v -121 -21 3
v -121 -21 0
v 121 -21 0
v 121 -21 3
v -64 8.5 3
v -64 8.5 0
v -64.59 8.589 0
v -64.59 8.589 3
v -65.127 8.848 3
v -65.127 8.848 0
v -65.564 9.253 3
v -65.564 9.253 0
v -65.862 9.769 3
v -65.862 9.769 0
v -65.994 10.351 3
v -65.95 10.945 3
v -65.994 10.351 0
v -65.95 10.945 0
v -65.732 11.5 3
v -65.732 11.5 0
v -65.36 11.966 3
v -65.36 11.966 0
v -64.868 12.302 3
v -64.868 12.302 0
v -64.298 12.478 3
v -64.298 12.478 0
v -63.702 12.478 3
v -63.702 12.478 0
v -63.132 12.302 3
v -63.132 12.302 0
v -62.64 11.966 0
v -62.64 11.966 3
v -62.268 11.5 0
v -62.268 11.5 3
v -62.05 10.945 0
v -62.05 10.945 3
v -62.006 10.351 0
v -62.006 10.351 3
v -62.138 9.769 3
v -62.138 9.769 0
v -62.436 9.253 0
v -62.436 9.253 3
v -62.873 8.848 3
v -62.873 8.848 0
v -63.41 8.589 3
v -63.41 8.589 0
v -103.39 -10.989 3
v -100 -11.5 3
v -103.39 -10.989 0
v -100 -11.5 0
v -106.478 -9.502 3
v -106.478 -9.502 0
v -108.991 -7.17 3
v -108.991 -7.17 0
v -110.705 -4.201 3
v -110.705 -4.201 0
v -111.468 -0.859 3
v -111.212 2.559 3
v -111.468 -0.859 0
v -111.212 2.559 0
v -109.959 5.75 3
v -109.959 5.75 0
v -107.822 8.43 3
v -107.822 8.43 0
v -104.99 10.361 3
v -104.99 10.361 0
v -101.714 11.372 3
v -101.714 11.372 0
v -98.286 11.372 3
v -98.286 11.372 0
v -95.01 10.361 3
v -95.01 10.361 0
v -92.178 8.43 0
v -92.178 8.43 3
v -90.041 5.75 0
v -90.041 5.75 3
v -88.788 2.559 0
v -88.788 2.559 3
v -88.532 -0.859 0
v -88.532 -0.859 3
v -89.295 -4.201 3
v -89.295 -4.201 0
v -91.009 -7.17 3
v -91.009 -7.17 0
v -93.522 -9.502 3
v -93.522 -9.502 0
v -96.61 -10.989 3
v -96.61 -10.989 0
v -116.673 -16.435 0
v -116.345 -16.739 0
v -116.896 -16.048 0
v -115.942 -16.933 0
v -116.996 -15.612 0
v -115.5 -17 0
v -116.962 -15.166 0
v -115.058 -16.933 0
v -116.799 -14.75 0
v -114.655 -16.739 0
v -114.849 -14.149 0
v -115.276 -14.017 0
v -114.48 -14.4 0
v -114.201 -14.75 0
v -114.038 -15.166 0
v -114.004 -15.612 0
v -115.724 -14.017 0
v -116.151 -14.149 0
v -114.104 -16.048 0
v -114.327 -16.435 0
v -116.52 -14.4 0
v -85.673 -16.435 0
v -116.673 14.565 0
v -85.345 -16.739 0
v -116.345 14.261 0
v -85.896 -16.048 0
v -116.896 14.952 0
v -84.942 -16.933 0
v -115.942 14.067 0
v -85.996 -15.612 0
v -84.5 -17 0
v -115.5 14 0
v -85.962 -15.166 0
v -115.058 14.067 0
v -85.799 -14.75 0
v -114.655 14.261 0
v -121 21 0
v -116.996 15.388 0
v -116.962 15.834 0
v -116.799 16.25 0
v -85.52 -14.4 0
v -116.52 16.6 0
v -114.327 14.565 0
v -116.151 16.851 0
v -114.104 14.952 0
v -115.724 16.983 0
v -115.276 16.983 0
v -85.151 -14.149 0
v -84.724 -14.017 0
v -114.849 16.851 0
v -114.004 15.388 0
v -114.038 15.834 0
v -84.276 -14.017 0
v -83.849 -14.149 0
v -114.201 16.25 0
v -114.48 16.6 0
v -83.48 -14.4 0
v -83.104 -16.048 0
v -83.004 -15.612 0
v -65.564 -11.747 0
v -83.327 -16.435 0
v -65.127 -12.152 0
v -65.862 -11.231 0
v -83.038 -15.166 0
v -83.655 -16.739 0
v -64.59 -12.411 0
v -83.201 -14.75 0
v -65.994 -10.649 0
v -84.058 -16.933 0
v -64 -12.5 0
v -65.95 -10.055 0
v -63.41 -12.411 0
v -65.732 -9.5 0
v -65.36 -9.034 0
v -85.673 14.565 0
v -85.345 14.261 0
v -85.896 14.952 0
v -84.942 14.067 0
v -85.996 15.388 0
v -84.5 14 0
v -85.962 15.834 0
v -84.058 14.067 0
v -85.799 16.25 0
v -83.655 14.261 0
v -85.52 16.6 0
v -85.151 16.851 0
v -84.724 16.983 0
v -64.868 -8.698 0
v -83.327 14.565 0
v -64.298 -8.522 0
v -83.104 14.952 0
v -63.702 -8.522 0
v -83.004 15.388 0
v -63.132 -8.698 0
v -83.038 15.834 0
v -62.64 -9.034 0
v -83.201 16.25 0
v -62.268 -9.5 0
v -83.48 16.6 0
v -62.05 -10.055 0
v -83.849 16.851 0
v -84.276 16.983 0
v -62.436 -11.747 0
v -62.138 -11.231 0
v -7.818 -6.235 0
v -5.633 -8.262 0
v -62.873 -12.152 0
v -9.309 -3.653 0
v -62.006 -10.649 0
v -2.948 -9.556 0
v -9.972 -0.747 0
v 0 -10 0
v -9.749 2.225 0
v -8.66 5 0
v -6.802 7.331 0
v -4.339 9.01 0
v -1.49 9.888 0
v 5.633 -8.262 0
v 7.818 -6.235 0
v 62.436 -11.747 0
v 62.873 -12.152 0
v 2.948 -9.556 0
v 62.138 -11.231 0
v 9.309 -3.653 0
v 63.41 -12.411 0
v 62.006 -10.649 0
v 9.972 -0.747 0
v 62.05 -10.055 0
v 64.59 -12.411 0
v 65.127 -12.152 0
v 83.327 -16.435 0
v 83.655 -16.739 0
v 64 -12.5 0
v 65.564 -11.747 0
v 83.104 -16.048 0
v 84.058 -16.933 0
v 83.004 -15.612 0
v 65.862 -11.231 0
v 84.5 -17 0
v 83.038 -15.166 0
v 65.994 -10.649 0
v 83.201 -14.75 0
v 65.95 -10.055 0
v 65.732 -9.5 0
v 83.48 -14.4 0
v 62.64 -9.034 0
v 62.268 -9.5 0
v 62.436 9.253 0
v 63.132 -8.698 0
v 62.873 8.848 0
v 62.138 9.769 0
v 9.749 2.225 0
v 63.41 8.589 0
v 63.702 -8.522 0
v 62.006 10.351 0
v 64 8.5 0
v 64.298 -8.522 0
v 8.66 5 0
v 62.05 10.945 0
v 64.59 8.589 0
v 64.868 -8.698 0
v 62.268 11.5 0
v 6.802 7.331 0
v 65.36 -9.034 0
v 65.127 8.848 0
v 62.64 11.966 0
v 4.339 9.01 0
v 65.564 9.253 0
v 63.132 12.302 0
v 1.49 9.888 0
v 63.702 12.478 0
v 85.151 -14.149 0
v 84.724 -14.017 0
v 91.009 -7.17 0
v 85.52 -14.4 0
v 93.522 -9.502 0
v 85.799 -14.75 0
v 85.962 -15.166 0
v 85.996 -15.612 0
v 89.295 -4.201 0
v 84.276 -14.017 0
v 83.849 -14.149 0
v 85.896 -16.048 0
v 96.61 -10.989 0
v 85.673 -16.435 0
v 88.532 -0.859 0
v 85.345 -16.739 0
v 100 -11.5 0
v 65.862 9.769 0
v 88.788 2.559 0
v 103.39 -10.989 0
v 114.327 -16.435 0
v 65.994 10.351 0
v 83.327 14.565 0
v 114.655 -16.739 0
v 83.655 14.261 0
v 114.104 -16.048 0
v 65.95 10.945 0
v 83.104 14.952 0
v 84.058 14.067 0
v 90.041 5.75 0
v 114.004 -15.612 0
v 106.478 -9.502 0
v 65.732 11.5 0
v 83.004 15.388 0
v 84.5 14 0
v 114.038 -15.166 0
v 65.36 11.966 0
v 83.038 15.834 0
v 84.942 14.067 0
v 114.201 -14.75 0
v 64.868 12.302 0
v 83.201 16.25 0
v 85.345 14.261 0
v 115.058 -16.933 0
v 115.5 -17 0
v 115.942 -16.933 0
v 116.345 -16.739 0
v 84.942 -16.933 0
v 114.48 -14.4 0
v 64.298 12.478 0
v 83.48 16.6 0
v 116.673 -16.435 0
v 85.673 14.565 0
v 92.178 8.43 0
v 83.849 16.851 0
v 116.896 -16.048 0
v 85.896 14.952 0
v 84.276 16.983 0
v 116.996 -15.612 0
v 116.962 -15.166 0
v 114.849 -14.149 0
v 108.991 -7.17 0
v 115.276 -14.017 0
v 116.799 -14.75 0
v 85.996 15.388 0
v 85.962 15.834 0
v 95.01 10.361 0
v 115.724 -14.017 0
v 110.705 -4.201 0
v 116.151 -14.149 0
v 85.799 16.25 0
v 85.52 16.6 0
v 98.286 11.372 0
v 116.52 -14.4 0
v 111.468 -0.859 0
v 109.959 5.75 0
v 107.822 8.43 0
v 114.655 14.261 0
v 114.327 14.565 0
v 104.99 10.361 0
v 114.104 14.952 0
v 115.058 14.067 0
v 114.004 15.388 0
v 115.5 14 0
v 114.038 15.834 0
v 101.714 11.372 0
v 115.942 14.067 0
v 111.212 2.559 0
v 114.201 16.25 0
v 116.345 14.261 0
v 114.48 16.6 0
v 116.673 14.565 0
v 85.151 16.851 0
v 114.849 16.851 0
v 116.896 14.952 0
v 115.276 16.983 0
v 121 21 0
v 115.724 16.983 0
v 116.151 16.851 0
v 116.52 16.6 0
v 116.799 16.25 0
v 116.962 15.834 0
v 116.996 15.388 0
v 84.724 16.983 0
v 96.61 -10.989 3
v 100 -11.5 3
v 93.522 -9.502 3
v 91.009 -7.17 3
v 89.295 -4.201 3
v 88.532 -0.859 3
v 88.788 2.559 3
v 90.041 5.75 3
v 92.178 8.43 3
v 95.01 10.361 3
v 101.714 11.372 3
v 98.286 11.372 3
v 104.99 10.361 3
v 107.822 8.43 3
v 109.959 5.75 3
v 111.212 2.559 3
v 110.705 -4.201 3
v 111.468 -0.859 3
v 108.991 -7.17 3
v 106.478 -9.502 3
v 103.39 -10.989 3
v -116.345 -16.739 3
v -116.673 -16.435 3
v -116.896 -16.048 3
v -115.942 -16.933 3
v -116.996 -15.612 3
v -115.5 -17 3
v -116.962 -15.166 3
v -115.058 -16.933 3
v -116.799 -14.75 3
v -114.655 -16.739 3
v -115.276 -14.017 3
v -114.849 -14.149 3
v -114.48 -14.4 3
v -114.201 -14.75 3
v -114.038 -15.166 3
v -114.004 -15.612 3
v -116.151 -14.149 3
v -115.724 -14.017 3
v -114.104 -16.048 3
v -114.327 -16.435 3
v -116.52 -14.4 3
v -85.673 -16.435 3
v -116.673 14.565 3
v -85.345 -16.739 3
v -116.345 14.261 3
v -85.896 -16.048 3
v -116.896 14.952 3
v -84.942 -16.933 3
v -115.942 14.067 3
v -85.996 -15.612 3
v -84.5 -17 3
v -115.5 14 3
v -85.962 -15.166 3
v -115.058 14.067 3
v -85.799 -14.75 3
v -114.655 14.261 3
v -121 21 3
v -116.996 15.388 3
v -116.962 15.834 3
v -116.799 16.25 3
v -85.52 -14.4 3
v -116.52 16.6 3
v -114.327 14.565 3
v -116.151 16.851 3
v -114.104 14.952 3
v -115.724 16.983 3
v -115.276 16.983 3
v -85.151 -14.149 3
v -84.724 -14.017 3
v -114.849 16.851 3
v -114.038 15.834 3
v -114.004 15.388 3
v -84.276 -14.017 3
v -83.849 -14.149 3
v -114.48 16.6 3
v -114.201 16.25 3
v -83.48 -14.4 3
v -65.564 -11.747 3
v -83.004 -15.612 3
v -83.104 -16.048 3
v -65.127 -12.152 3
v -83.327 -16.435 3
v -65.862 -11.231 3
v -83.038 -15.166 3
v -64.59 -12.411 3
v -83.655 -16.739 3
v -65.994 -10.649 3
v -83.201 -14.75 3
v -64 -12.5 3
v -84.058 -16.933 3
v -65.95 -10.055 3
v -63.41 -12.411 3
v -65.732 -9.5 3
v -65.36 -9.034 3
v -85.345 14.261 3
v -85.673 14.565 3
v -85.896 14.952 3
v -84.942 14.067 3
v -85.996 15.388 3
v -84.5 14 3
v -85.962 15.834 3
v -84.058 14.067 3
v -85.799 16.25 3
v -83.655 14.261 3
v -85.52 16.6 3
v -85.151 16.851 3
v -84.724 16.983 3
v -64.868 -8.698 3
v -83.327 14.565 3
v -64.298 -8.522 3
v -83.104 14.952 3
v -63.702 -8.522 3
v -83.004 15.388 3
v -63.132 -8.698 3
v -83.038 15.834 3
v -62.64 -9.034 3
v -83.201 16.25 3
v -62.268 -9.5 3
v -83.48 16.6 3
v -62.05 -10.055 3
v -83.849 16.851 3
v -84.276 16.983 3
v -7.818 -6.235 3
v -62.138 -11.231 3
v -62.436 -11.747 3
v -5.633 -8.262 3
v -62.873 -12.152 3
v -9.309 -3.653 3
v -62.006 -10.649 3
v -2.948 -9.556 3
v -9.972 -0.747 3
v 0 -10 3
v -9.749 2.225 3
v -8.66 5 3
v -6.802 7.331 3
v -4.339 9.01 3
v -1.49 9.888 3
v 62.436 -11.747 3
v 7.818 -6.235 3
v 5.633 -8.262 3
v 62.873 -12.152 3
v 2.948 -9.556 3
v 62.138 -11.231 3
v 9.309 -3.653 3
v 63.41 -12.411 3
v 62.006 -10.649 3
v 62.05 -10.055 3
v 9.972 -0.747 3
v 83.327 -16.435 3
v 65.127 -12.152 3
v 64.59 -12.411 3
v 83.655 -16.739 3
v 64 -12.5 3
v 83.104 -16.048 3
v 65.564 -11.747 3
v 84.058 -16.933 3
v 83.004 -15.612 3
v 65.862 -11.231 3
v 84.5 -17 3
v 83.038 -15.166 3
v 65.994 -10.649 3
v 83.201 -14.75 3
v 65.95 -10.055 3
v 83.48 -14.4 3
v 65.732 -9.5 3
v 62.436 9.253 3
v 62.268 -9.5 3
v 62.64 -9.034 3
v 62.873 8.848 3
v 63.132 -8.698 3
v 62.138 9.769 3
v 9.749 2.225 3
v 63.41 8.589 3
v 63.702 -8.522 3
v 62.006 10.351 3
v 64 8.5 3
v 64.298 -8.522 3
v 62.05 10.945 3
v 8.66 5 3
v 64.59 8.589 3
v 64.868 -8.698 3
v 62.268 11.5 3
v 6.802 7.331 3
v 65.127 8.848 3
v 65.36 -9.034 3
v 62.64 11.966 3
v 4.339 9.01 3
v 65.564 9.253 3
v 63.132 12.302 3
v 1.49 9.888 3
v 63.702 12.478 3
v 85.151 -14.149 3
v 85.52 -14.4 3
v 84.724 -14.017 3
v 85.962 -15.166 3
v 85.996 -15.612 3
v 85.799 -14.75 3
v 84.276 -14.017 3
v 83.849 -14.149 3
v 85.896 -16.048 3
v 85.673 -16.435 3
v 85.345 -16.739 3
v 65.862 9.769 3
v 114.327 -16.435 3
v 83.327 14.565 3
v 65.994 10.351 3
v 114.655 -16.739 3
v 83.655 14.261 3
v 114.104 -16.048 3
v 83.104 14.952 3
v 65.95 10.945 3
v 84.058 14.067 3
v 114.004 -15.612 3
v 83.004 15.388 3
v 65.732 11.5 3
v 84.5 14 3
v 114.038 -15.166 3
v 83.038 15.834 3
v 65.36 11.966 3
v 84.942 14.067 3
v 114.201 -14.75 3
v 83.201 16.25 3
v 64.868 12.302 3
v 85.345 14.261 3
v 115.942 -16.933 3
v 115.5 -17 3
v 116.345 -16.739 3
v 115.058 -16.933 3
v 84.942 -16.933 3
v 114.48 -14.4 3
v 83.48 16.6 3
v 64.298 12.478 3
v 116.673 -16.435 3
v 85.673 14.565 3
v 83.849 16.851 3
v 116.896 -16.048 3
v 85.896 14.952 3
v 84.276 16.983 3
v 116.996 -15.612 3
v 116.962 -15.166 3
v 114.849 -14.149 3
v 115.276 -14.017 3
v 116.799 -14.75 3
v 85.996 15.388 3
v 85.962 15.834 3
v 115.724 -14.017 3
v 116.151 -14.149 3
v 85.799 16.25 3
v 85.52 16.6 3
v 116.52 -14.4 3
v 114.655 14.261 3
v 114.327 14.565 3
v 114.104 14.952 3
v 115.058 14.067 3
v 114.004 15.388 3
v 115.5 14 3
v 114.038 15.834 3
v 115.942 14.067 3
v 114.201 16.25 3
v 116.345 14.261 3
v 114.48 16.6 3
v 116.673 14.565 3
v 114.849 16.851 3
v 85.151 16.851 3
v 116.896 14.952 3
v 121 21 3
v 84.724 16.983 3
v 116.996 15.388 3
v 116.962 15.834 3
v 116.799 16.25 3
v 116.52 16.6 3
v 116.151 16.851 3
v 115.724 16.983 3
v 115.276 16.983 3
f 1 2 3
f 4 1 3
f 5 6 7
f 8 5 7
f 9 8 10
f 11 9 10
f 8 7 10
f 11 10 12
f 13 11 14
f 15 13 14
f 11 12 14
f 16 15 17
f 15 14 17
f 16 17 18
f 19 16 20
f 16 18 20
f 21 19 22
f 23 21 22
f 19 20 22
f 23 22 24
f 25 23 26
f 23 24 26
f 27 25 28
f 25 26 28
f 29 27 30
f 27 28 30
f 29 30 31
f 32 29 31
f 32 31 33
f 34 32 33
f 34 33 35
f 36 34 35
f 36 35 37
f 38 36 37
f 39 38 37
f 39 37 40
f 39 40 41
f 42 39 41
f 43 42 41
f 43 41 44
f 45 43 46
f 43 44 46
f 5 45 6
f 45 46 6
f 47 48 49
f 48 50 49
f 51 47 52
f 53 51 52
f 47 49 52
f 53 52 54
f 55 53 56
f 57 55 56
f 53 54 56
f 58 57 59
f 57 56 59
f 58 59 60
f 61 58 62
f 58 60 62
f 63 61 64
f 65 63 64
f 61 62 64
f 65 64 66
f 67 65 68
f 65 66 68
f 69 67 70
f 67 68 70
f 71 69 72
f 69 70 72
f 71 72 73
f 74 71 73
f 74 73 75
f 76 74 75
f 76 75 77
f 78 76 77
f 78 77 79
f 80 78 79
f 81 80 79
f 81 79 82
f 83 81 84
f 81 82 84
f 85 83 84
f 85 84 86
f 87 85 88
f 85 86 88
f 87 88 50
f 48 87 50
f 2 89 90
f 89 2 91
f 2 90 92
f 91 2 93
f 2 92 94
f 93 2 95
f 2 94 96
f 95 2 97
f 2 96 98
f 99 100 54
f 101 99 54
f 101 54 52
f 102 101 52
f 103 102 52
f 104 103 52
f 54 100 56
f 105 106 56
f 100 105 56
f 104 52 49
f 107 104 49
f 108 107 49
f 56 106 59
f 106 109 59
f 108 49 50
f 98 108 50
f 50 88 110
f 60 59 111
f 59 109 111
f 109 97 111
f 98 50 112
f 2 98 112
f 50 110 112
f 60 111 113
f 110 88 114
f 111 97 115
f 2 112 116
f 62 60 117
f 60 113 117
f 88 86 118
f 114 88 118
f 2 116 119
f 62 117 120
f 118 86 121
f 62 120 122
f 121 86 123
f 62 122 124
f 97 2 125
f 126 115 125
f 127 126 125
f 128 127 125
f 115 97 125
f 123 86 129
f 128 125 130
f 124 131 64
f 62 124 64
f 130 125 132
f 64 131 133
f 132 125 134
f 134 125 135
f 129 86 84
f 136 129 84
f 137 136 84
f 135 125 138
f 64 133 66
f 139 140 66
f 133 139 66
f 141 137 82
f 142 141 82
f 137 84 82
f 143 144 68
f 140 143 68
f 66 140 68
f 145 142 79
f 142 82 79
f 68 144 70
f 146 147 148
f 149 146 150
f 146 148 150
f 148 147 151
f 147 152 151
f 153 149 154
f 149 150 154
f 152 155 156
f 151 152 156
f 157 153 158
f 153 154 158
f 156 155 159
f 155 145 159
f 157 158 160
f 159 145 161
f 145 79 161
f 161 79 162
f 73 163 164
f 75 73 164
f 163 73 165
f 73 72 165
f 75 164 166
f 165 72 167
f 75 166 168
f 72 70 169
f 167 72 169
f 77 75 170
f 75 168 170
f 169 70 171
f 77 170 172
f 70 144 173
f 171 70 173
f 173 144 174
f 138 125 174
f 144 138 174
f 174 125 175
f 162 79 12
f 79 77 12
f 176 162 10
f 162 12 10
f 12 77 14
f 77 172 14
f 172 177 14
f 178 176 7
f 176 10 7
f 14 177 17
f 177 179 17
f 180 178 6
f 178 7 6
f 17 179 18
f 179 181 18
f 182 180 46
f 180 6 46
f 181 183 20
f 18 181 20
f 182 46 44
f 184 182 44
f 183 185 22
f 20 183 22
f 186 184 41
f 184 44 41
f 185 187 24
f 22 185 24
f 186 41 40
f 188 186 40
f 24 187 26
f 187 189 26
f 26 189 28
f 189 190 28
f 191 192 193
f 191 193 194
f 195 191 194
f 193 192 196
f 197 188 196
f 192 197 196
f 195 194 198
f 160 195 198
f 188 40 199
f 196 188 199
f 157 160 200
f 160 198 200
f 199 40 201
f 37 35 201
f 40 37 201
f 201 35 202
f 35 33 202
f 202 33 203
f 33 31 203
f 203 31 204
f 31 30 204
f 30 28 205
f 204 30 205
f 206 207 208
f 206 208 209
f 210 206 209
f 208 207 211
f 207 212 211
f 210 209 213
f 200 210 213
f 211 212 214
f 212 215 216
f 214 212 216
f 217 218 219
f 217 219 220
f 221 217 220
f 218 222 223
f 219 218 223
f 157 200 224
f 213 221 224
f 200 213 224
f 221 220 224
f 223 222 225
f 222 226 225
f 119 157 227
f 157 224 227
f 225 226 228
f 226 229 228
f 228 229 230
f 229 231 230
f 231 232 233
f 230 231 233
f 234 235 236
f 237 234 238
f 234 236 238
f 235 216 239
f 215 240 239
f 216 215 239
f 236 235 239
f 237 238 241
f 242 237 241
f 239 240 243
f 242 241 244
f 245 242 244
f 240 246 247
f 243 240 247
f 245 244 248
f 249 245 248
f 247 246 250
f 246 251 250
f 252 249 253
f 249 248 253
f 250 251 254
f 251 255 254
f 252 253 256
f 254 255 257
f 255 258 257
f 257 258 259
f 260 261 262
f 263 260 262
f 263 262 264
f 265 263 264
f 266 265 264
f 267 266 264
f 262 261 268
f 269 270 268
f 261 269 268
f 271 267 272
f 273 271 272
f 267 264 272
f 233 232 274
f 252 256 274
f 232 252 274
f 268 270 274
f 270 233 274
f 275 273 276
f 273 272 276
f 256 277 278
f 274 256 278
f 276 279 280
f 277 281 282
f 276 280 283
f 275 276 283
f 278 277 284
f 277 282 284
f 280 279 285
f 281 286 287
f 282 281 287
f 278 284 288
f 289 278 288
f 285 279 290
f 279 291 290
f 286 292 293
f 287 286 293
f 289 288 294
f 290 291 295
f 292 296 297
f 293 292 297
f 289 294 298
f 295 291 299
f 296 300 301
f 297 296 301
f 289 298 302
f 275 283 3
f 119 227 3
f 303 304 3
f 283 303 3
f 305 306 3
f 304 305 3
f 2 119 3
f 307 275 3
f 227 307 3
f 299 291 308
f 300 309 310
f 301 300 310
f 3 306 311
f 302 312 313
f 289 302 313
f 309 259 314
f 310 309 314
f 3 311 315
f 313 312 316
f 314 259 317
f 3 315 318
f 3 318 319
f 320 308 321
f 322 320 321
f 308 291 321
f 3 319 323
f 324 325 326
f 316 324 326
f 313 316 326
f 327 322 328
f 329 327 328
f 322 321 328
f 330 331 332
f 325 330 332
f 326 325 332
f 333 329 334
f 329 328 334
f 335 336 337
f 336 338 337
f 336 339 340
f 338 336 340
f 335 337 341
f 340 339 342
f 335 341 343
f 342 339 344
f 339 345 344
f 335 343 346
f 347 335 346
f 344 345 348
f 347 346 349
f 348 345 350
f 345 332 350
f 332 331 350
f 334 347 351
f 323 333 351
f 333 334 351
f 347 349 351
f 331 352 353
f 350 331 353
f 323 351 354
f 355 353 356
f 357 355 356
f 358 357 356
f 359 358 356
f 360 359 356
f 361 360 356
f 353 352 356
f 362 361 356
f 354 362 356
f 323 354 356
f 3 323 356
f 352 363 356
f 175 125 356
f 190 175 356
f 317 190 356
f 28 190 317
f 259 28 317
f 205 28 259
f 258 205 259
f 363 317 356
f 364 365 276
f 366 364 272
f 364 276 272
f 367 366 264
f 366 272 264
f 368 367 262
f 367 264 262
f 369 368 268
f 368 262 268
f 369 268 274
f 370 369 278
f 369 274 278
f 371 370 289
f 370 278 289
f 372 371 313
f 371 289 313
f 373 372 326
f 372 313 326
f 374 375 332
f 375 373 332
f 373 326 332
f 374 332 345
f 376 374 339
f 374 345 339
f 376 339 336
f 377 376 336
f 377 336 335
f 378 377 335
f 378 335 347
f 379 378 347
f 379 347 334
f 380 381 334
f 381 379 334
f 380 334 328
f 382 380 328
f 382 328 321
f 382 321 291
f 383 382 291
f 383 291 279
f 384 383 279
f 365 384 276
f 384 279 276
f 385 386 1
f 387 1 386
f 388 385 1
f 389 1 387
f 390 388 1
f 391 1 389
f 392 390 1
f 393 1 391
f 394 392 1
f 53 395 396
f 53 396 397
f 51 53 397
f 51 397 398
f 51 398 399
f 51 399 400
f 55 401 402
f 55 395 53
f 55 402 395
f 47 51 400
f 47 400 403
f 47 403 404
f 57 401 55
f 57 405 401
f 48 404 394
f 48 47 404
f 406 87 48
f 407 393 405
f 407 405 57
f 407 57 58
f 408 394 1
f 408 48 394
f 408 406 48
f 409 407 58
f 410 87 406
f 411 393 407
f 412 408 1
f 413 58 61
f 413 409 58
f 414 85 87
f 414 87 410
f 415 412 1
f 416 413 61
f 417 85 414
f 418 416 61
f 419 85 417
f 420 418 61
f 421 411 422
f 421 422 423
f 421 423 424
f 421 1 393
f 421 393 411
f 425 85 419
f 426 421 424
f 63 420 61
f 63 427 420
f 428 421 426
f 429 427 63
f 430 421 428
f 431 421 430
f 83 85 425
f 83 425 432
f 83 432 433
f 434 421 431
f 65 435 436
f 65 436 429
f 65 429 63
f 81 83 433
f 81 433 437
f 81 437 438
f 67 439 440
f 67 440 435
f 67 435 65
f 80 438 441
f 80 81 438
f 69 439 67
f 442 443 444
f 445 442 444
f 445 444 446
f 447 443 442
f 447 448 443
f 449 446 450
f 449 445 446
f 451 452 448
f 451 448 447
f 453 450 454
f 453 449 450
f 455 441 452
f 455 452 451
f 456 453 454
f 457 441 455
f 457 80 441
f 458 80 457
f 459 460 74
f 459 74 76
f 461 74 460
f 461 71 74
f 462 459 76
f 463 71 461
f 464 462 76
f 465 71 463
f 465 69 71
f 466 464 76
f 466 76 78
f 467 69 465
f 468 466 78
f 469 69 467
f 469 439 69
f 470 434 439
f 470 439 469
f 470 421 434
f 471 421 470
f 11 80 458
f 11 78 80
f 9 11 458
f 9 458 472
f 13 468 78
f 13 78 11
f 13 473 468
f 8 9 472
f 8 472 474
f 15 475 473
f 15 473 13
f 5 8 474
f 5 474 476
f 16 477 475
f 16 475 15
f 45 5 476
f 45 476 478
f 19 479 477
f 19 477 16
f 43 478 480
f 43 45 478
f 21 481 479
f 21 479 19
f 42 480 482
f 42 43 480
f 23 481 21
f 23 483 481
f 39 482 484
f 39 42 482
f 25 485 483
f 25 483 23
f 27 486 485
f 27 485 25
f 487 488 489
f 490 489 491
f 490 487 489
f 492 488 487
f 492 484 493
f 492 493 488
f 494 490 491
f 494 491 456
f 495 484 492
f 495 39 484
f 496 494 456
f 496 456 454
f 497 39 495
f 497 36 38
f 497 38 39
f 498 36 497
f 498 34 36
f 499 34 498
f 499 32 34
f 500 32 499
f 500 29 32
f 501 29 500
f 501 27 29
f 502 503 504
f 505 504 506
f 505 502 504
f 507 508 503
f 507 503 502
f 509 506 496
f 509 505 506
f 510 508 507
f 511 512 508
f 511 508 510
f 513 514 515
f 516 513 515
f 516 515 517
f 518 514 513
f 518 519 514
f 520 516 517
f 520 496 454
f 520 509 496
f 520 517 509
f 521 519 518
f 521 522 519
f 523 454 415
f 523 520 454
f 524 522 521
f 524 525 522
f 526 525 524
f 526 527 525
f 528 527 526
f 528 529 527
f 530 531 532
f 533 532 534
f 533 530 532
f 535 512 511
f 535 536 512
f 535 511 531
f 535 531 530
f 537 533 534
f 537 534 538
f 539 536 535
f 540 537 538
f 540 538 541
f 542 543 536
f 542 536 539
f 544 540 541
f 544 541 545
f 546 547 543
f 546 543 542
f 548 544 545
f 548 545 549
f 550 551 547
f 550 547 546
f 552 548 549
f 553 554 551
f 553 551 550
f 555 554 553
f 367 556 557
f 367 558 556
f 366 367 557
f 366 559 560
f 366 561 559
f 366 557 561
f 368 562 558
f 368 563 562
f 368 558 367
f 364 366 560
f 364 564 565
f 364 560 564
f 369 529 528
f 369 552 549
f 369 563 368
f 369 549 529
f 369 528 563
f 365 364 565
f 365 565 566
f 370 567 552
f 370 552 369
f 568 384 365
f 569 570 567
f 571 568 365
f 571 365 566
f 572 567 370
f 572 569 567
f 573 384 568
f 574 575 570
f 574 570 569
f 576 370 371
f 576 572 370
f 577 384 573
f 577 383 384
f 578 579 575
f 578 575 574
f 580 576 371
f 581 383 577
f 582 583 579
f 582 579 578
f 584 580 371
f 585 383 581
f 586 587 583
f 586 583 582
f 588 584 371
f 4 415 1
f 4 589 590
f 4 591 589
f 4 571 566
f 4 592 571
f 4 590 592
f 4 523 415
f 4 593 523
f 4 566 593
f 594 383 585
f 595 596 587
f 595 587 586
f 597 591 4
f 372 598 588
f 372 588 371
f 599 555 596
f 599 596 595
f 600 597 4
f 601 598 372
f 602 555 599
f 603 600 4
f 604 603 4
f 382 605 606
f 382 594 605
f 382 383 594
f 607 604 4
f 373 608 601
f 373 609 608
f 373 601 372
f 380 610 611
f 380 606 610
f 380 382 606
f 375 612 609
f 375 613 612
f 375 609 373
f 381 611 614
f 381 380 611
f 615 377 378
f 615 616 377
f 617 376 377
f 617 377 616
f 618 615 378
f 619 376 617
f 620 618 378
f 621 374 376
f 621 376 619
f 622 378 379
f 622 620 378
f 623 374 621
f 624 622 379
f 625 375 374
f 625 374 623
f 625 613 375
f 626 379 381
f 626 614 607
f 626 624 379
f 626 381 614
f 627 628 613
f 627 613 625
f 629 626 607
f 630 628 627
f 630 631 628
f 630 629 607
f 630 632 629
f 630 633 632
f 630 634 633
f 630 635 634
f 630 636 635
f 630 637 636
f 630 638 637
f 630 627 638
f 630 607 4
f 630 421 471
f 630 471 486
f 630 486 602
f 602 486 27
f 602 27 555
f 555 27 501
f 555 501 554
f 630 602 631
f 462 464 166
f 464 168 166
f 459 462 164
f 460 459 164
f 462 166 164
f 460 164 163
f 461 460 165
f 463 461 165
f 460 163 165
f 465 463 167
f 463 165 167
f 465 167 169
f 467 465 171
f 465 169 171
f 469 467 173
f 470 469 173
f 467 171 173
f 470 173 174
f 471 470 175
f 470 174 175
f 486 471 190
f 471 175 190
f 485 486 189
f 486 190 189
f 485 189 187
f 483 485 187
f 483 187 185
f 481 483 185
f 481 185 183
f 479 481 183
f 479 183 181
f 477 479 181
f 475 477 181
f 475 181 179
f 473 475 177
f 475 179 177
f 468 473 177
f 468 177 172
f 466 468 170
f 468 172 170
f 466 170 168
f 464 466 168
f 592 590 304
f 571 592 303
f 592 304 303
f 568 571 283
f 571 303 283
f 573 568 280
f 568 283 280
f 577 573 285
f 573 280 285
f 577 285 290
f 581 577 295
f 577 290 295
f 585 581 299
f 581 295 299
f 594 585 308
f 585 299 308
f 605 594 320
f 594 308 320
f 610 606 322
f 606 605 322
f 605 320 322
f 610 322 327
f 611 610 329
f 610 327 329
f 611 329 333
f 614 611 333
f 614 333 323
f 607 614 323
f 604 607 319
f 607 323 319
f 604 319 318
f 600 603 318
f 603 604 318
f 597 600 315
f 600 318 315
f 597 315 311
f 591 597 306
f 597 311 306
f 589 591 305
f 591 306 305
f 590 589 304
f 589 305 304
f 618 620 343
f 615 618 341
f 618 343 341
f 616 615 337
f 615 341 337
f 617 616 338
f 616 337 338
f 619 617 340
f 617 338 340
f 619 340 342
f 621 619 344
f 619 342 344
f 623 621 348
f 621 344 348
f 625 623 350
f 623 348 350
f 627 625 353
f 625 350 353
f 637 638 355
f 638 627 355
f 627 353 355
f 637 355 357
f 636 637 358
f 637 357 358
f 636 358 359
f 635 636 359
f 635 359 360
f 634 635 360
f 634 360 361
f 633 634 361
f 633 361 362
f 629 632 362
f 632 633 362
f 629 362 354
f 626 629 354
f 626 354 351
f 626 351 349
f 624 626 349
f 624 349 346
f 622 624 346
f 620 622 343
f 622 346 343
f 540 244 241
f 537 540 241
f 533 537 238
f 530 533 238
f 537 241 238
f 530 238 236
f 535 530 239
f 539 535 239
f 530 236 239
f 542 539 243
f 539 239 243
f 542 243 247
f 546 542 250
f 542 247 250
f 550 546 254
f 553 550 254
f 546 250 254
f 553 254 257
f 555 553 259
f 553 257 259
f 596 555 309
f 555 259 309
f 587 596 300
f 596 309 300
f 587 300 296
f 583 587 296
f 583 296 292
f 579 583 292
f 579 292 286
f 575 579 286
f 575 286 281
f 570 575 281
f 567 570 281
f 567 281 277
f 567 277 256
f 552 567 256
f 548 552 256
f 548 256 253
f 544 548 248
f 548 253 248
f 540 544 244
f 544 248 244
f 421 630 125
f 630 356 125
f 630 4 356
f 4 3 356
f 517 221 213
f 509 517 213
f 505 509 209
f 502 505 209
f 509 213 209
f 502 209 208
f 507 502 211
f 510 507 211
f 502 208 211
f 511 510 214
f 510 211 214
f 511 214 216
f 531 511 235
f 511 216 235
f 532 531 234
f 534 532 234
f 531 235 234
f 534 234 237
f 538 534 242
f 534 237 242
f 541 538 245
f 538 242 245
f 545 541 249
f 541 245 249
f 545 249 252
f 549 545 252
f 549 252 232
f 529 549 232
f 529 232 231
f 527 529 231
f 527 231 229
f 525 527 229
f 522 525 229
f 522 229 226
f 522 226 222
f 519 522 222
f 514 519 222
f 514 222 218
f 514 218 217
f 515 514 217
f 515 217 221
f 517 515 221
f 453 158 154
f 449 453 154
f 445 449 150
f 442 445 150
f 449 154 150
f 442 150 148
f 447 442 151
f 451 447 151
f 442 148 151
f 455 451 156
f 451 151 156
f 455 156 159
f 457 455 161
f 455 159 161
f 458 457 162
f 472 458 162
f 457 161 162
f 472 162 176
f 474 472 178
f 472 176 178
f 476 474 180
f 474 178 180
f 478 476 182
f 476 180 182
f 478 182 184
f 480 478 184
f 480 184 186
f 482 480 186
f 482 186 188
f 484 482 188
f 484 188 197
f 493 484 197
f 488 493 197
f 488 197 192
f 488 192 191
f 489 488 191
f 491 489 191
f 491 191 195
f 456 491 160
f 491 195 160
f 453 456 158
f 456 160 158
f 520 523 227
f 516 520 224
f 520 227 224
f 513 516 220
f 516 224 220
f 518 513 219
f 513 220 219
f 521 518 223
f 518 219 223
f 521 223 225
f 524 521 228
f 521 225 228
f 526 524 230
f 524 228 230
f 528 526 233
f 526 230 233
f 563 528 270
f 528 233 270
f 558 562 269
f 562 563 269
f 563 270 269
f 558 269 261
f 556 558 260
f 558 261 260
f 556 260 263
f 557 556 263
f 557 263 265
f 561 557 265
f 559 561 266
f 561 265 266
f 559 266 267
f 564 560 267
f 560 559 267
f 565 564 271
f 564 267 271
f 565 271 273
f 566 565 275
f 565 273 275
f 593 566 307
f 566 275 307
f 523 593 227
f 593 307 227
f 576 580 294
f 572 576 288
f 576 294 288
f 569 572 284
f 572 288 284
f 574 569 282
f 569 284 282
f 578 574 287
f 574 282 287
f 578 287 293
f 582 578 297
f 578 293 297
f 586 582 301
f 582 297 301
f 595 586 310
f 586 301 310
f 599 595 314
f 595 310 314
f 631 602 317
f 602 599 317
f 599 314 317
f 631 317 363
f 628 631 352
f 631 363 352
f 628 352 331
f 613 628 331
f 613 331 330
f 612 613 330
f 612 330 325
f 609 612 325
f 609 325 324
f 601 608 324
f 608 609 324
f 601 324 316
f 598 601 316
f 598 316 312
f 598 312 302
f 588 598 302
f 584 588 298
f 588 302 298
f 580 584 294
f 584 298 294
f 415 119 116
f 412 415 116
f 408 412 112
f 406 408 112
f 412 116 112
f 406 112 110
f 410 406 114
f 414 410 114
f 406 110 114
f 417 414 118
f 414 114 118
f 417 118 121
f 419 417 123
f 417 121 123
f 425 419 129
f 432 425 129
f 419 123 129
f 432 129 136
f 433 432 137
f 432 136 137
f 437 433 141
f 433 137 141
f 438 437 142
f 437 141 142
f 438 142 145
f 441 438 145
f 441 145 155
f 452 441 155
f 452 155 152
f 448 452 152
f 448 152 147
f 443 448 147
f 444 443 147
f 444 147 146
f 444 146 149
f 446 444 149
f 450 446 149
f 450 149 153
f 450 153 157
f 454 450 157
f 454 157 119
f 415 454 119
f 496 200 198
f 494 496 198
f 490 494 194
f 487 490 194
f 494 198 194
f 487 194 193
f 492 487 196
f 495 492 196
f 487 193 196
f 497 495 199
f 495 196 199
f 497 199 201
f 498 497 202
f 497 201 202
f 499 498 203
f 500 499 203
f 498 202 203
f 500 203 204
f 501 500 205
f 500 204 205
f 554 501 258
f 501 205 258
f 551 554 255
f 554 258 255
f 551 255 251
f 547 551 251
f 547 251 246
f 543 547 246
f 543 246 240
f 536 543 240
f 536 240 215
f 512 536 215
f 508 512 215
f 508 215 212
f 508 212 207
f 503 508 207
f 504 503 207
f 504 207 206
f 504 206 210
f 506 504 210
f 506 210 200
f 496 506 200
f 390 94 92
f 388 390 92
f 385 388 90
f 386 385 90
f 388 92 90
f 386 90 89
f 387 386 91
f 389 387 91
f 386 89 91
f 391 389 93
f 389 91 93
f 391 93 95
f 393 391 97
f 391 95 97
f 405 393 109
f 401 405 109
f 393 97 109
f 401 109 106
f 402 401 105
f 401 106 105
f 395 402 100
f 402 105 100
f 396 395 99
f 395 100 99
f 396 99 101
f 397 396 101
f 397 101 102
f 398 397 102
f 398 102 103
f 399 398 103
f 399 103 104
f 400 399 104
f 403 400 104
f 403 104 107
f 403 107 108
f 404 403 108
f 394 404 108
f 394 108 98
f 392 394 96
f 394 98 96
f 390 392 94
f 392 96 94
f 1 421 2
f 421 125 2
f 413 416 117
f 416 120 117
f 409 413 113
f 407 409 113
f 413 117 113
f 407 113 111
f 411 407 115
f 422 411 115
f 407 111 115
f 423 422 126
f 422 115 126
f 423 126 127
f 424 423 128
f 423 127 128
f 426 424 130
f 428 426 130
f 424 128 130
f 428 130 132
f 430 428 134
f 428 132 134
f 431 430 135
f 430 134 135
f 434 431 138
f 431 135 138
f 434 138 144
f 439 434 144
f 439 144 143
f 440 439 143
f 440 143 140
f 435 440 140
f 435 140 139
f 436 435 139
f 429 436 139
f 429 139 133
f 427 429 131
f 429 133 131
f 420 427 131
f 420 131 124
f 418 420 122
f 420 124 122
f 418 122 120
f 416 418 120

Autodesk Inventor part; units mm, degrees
ref_plane "YZ Plane" through (0, 0, 0) normal (1, 0, 0) x (0, 1, 0)
ref_plane "XZ Plane" through (0, 0, 0) normal (0, 1, 0) x (-1, 0, 0)
ref_plane "XY Plane" through (0, 0, 0) normal (0, 0, 1) x (1, 0, 0)
sketch "Esboço1" plane through (0, 0, 0) normal (0, 0, 1) x (1, 0, 0)
  line L0 (-121, -21) -> (121, -21)
  line L1 (121, -21) -> (121, 21)
  line L2 (121, 21) -> (-121, 21)
  line L3 (-121, 21) -> (-121, -21)
  line L4 (-121, -21) -> (121, 21) construction
  line L5 (121, -21) -> (-121, 21) construction
  point P0 (0, 0)
  dimension "d0" = 242
  dimension "d1" = 42
extrude "Extrusão1" add sketch "Esboço1" along normal blind 3
sketch "Esboço2" plane through (0, 0, 3) normal (0, 0, 1) x (1, 0, 0)
  line L0 (121, 21) -> (-121, 21) projected
  line L1 (-121, 21) -> (-79, 21)
  line L2 (-79, 21) -> (-79, -21)
  line L3 (-79, -21) -> (-121, -21)
  line L4 (-121, -21) -> (-121, 21)
  line L5 (-115.5, -15.5) -> (-84.5, -15.5)
  line L6 (-84.5, -15.5) -> (-84.5, 15.5)
  line L7 (-84.5, 15.5) -> (-115.5, 15.5)
  line L8 (-115.5, 15.5) -> (-115.5, -15.5)
  line L9 (-115.5, -15.5) -> (-84.5, 15.5) construction
  line L10 (-84.5, -15.5) -> (-115.5, 15.5) construction
  point P0 (0, 0)
  point P1 (-100, 0)
  point P2 (-100, 21)
  point P3 (-100, 15.5)
  point P4 (-121, 0)
  point P5 (-115.5, 0)
  dimension "d4" = 42
  dimension "d5" = 42
  dimension "d6" = 31
  dimension "d7" = 31
hole "Furo1" at (-115.5, 15.5, 3) at (-84.5, 15.5, 3) at (-84.5, -15.5, 3) at (-115.5, -15.5, 3) direction (0, 0, -1) diameter 3 end through all
hole "Furo2" at (-100, 0, 3) direction (0, 0, -1) diameter 23 end through all
mirror "Espelhamento1" about plane through (0, 0, 0) normal (1, 0, 0) of "Furo1", "Furo2"
sketch "Esboço3" plane through (0, 0, 3) normal (0, 0, 1) x (1, 0, 0)
  circle A0 centre (64, 10.5) radius 1.621 projected
  circle A1 centre (64, -10.5) radius 1.621 projected
  circle A2 centre (-64, 10.5) radius 1.621 projected
  circle A3 centre (-64, -10.5) radius 1.621 projected
  point P0 (0, 0)
hole "Furo3" at (64, -10.5, 3) at (64, 10.5, 3) at (-64, 10.5, 3) at (-64, -10.5, 3) direction (0, 0, -1) diameter 4 end through all
sketch "Esboço4" plane through (0, 0, 3) normal (0, 0, 1) x (1, 0, 0)
  line L0 (121, 21) -> (-121, 21) projected
  line L1 (-121, 21) -> (-121, -21) projected
  point P0 (0, 0)
  point P1 (0, 0)
  dimension "d29" = 21
  dimension "d30" = 121
hole "Furo4" at (0, 0, 3) direction (0, 0, -1) diameter 20 end through all
properties part number "chapa lateral"
